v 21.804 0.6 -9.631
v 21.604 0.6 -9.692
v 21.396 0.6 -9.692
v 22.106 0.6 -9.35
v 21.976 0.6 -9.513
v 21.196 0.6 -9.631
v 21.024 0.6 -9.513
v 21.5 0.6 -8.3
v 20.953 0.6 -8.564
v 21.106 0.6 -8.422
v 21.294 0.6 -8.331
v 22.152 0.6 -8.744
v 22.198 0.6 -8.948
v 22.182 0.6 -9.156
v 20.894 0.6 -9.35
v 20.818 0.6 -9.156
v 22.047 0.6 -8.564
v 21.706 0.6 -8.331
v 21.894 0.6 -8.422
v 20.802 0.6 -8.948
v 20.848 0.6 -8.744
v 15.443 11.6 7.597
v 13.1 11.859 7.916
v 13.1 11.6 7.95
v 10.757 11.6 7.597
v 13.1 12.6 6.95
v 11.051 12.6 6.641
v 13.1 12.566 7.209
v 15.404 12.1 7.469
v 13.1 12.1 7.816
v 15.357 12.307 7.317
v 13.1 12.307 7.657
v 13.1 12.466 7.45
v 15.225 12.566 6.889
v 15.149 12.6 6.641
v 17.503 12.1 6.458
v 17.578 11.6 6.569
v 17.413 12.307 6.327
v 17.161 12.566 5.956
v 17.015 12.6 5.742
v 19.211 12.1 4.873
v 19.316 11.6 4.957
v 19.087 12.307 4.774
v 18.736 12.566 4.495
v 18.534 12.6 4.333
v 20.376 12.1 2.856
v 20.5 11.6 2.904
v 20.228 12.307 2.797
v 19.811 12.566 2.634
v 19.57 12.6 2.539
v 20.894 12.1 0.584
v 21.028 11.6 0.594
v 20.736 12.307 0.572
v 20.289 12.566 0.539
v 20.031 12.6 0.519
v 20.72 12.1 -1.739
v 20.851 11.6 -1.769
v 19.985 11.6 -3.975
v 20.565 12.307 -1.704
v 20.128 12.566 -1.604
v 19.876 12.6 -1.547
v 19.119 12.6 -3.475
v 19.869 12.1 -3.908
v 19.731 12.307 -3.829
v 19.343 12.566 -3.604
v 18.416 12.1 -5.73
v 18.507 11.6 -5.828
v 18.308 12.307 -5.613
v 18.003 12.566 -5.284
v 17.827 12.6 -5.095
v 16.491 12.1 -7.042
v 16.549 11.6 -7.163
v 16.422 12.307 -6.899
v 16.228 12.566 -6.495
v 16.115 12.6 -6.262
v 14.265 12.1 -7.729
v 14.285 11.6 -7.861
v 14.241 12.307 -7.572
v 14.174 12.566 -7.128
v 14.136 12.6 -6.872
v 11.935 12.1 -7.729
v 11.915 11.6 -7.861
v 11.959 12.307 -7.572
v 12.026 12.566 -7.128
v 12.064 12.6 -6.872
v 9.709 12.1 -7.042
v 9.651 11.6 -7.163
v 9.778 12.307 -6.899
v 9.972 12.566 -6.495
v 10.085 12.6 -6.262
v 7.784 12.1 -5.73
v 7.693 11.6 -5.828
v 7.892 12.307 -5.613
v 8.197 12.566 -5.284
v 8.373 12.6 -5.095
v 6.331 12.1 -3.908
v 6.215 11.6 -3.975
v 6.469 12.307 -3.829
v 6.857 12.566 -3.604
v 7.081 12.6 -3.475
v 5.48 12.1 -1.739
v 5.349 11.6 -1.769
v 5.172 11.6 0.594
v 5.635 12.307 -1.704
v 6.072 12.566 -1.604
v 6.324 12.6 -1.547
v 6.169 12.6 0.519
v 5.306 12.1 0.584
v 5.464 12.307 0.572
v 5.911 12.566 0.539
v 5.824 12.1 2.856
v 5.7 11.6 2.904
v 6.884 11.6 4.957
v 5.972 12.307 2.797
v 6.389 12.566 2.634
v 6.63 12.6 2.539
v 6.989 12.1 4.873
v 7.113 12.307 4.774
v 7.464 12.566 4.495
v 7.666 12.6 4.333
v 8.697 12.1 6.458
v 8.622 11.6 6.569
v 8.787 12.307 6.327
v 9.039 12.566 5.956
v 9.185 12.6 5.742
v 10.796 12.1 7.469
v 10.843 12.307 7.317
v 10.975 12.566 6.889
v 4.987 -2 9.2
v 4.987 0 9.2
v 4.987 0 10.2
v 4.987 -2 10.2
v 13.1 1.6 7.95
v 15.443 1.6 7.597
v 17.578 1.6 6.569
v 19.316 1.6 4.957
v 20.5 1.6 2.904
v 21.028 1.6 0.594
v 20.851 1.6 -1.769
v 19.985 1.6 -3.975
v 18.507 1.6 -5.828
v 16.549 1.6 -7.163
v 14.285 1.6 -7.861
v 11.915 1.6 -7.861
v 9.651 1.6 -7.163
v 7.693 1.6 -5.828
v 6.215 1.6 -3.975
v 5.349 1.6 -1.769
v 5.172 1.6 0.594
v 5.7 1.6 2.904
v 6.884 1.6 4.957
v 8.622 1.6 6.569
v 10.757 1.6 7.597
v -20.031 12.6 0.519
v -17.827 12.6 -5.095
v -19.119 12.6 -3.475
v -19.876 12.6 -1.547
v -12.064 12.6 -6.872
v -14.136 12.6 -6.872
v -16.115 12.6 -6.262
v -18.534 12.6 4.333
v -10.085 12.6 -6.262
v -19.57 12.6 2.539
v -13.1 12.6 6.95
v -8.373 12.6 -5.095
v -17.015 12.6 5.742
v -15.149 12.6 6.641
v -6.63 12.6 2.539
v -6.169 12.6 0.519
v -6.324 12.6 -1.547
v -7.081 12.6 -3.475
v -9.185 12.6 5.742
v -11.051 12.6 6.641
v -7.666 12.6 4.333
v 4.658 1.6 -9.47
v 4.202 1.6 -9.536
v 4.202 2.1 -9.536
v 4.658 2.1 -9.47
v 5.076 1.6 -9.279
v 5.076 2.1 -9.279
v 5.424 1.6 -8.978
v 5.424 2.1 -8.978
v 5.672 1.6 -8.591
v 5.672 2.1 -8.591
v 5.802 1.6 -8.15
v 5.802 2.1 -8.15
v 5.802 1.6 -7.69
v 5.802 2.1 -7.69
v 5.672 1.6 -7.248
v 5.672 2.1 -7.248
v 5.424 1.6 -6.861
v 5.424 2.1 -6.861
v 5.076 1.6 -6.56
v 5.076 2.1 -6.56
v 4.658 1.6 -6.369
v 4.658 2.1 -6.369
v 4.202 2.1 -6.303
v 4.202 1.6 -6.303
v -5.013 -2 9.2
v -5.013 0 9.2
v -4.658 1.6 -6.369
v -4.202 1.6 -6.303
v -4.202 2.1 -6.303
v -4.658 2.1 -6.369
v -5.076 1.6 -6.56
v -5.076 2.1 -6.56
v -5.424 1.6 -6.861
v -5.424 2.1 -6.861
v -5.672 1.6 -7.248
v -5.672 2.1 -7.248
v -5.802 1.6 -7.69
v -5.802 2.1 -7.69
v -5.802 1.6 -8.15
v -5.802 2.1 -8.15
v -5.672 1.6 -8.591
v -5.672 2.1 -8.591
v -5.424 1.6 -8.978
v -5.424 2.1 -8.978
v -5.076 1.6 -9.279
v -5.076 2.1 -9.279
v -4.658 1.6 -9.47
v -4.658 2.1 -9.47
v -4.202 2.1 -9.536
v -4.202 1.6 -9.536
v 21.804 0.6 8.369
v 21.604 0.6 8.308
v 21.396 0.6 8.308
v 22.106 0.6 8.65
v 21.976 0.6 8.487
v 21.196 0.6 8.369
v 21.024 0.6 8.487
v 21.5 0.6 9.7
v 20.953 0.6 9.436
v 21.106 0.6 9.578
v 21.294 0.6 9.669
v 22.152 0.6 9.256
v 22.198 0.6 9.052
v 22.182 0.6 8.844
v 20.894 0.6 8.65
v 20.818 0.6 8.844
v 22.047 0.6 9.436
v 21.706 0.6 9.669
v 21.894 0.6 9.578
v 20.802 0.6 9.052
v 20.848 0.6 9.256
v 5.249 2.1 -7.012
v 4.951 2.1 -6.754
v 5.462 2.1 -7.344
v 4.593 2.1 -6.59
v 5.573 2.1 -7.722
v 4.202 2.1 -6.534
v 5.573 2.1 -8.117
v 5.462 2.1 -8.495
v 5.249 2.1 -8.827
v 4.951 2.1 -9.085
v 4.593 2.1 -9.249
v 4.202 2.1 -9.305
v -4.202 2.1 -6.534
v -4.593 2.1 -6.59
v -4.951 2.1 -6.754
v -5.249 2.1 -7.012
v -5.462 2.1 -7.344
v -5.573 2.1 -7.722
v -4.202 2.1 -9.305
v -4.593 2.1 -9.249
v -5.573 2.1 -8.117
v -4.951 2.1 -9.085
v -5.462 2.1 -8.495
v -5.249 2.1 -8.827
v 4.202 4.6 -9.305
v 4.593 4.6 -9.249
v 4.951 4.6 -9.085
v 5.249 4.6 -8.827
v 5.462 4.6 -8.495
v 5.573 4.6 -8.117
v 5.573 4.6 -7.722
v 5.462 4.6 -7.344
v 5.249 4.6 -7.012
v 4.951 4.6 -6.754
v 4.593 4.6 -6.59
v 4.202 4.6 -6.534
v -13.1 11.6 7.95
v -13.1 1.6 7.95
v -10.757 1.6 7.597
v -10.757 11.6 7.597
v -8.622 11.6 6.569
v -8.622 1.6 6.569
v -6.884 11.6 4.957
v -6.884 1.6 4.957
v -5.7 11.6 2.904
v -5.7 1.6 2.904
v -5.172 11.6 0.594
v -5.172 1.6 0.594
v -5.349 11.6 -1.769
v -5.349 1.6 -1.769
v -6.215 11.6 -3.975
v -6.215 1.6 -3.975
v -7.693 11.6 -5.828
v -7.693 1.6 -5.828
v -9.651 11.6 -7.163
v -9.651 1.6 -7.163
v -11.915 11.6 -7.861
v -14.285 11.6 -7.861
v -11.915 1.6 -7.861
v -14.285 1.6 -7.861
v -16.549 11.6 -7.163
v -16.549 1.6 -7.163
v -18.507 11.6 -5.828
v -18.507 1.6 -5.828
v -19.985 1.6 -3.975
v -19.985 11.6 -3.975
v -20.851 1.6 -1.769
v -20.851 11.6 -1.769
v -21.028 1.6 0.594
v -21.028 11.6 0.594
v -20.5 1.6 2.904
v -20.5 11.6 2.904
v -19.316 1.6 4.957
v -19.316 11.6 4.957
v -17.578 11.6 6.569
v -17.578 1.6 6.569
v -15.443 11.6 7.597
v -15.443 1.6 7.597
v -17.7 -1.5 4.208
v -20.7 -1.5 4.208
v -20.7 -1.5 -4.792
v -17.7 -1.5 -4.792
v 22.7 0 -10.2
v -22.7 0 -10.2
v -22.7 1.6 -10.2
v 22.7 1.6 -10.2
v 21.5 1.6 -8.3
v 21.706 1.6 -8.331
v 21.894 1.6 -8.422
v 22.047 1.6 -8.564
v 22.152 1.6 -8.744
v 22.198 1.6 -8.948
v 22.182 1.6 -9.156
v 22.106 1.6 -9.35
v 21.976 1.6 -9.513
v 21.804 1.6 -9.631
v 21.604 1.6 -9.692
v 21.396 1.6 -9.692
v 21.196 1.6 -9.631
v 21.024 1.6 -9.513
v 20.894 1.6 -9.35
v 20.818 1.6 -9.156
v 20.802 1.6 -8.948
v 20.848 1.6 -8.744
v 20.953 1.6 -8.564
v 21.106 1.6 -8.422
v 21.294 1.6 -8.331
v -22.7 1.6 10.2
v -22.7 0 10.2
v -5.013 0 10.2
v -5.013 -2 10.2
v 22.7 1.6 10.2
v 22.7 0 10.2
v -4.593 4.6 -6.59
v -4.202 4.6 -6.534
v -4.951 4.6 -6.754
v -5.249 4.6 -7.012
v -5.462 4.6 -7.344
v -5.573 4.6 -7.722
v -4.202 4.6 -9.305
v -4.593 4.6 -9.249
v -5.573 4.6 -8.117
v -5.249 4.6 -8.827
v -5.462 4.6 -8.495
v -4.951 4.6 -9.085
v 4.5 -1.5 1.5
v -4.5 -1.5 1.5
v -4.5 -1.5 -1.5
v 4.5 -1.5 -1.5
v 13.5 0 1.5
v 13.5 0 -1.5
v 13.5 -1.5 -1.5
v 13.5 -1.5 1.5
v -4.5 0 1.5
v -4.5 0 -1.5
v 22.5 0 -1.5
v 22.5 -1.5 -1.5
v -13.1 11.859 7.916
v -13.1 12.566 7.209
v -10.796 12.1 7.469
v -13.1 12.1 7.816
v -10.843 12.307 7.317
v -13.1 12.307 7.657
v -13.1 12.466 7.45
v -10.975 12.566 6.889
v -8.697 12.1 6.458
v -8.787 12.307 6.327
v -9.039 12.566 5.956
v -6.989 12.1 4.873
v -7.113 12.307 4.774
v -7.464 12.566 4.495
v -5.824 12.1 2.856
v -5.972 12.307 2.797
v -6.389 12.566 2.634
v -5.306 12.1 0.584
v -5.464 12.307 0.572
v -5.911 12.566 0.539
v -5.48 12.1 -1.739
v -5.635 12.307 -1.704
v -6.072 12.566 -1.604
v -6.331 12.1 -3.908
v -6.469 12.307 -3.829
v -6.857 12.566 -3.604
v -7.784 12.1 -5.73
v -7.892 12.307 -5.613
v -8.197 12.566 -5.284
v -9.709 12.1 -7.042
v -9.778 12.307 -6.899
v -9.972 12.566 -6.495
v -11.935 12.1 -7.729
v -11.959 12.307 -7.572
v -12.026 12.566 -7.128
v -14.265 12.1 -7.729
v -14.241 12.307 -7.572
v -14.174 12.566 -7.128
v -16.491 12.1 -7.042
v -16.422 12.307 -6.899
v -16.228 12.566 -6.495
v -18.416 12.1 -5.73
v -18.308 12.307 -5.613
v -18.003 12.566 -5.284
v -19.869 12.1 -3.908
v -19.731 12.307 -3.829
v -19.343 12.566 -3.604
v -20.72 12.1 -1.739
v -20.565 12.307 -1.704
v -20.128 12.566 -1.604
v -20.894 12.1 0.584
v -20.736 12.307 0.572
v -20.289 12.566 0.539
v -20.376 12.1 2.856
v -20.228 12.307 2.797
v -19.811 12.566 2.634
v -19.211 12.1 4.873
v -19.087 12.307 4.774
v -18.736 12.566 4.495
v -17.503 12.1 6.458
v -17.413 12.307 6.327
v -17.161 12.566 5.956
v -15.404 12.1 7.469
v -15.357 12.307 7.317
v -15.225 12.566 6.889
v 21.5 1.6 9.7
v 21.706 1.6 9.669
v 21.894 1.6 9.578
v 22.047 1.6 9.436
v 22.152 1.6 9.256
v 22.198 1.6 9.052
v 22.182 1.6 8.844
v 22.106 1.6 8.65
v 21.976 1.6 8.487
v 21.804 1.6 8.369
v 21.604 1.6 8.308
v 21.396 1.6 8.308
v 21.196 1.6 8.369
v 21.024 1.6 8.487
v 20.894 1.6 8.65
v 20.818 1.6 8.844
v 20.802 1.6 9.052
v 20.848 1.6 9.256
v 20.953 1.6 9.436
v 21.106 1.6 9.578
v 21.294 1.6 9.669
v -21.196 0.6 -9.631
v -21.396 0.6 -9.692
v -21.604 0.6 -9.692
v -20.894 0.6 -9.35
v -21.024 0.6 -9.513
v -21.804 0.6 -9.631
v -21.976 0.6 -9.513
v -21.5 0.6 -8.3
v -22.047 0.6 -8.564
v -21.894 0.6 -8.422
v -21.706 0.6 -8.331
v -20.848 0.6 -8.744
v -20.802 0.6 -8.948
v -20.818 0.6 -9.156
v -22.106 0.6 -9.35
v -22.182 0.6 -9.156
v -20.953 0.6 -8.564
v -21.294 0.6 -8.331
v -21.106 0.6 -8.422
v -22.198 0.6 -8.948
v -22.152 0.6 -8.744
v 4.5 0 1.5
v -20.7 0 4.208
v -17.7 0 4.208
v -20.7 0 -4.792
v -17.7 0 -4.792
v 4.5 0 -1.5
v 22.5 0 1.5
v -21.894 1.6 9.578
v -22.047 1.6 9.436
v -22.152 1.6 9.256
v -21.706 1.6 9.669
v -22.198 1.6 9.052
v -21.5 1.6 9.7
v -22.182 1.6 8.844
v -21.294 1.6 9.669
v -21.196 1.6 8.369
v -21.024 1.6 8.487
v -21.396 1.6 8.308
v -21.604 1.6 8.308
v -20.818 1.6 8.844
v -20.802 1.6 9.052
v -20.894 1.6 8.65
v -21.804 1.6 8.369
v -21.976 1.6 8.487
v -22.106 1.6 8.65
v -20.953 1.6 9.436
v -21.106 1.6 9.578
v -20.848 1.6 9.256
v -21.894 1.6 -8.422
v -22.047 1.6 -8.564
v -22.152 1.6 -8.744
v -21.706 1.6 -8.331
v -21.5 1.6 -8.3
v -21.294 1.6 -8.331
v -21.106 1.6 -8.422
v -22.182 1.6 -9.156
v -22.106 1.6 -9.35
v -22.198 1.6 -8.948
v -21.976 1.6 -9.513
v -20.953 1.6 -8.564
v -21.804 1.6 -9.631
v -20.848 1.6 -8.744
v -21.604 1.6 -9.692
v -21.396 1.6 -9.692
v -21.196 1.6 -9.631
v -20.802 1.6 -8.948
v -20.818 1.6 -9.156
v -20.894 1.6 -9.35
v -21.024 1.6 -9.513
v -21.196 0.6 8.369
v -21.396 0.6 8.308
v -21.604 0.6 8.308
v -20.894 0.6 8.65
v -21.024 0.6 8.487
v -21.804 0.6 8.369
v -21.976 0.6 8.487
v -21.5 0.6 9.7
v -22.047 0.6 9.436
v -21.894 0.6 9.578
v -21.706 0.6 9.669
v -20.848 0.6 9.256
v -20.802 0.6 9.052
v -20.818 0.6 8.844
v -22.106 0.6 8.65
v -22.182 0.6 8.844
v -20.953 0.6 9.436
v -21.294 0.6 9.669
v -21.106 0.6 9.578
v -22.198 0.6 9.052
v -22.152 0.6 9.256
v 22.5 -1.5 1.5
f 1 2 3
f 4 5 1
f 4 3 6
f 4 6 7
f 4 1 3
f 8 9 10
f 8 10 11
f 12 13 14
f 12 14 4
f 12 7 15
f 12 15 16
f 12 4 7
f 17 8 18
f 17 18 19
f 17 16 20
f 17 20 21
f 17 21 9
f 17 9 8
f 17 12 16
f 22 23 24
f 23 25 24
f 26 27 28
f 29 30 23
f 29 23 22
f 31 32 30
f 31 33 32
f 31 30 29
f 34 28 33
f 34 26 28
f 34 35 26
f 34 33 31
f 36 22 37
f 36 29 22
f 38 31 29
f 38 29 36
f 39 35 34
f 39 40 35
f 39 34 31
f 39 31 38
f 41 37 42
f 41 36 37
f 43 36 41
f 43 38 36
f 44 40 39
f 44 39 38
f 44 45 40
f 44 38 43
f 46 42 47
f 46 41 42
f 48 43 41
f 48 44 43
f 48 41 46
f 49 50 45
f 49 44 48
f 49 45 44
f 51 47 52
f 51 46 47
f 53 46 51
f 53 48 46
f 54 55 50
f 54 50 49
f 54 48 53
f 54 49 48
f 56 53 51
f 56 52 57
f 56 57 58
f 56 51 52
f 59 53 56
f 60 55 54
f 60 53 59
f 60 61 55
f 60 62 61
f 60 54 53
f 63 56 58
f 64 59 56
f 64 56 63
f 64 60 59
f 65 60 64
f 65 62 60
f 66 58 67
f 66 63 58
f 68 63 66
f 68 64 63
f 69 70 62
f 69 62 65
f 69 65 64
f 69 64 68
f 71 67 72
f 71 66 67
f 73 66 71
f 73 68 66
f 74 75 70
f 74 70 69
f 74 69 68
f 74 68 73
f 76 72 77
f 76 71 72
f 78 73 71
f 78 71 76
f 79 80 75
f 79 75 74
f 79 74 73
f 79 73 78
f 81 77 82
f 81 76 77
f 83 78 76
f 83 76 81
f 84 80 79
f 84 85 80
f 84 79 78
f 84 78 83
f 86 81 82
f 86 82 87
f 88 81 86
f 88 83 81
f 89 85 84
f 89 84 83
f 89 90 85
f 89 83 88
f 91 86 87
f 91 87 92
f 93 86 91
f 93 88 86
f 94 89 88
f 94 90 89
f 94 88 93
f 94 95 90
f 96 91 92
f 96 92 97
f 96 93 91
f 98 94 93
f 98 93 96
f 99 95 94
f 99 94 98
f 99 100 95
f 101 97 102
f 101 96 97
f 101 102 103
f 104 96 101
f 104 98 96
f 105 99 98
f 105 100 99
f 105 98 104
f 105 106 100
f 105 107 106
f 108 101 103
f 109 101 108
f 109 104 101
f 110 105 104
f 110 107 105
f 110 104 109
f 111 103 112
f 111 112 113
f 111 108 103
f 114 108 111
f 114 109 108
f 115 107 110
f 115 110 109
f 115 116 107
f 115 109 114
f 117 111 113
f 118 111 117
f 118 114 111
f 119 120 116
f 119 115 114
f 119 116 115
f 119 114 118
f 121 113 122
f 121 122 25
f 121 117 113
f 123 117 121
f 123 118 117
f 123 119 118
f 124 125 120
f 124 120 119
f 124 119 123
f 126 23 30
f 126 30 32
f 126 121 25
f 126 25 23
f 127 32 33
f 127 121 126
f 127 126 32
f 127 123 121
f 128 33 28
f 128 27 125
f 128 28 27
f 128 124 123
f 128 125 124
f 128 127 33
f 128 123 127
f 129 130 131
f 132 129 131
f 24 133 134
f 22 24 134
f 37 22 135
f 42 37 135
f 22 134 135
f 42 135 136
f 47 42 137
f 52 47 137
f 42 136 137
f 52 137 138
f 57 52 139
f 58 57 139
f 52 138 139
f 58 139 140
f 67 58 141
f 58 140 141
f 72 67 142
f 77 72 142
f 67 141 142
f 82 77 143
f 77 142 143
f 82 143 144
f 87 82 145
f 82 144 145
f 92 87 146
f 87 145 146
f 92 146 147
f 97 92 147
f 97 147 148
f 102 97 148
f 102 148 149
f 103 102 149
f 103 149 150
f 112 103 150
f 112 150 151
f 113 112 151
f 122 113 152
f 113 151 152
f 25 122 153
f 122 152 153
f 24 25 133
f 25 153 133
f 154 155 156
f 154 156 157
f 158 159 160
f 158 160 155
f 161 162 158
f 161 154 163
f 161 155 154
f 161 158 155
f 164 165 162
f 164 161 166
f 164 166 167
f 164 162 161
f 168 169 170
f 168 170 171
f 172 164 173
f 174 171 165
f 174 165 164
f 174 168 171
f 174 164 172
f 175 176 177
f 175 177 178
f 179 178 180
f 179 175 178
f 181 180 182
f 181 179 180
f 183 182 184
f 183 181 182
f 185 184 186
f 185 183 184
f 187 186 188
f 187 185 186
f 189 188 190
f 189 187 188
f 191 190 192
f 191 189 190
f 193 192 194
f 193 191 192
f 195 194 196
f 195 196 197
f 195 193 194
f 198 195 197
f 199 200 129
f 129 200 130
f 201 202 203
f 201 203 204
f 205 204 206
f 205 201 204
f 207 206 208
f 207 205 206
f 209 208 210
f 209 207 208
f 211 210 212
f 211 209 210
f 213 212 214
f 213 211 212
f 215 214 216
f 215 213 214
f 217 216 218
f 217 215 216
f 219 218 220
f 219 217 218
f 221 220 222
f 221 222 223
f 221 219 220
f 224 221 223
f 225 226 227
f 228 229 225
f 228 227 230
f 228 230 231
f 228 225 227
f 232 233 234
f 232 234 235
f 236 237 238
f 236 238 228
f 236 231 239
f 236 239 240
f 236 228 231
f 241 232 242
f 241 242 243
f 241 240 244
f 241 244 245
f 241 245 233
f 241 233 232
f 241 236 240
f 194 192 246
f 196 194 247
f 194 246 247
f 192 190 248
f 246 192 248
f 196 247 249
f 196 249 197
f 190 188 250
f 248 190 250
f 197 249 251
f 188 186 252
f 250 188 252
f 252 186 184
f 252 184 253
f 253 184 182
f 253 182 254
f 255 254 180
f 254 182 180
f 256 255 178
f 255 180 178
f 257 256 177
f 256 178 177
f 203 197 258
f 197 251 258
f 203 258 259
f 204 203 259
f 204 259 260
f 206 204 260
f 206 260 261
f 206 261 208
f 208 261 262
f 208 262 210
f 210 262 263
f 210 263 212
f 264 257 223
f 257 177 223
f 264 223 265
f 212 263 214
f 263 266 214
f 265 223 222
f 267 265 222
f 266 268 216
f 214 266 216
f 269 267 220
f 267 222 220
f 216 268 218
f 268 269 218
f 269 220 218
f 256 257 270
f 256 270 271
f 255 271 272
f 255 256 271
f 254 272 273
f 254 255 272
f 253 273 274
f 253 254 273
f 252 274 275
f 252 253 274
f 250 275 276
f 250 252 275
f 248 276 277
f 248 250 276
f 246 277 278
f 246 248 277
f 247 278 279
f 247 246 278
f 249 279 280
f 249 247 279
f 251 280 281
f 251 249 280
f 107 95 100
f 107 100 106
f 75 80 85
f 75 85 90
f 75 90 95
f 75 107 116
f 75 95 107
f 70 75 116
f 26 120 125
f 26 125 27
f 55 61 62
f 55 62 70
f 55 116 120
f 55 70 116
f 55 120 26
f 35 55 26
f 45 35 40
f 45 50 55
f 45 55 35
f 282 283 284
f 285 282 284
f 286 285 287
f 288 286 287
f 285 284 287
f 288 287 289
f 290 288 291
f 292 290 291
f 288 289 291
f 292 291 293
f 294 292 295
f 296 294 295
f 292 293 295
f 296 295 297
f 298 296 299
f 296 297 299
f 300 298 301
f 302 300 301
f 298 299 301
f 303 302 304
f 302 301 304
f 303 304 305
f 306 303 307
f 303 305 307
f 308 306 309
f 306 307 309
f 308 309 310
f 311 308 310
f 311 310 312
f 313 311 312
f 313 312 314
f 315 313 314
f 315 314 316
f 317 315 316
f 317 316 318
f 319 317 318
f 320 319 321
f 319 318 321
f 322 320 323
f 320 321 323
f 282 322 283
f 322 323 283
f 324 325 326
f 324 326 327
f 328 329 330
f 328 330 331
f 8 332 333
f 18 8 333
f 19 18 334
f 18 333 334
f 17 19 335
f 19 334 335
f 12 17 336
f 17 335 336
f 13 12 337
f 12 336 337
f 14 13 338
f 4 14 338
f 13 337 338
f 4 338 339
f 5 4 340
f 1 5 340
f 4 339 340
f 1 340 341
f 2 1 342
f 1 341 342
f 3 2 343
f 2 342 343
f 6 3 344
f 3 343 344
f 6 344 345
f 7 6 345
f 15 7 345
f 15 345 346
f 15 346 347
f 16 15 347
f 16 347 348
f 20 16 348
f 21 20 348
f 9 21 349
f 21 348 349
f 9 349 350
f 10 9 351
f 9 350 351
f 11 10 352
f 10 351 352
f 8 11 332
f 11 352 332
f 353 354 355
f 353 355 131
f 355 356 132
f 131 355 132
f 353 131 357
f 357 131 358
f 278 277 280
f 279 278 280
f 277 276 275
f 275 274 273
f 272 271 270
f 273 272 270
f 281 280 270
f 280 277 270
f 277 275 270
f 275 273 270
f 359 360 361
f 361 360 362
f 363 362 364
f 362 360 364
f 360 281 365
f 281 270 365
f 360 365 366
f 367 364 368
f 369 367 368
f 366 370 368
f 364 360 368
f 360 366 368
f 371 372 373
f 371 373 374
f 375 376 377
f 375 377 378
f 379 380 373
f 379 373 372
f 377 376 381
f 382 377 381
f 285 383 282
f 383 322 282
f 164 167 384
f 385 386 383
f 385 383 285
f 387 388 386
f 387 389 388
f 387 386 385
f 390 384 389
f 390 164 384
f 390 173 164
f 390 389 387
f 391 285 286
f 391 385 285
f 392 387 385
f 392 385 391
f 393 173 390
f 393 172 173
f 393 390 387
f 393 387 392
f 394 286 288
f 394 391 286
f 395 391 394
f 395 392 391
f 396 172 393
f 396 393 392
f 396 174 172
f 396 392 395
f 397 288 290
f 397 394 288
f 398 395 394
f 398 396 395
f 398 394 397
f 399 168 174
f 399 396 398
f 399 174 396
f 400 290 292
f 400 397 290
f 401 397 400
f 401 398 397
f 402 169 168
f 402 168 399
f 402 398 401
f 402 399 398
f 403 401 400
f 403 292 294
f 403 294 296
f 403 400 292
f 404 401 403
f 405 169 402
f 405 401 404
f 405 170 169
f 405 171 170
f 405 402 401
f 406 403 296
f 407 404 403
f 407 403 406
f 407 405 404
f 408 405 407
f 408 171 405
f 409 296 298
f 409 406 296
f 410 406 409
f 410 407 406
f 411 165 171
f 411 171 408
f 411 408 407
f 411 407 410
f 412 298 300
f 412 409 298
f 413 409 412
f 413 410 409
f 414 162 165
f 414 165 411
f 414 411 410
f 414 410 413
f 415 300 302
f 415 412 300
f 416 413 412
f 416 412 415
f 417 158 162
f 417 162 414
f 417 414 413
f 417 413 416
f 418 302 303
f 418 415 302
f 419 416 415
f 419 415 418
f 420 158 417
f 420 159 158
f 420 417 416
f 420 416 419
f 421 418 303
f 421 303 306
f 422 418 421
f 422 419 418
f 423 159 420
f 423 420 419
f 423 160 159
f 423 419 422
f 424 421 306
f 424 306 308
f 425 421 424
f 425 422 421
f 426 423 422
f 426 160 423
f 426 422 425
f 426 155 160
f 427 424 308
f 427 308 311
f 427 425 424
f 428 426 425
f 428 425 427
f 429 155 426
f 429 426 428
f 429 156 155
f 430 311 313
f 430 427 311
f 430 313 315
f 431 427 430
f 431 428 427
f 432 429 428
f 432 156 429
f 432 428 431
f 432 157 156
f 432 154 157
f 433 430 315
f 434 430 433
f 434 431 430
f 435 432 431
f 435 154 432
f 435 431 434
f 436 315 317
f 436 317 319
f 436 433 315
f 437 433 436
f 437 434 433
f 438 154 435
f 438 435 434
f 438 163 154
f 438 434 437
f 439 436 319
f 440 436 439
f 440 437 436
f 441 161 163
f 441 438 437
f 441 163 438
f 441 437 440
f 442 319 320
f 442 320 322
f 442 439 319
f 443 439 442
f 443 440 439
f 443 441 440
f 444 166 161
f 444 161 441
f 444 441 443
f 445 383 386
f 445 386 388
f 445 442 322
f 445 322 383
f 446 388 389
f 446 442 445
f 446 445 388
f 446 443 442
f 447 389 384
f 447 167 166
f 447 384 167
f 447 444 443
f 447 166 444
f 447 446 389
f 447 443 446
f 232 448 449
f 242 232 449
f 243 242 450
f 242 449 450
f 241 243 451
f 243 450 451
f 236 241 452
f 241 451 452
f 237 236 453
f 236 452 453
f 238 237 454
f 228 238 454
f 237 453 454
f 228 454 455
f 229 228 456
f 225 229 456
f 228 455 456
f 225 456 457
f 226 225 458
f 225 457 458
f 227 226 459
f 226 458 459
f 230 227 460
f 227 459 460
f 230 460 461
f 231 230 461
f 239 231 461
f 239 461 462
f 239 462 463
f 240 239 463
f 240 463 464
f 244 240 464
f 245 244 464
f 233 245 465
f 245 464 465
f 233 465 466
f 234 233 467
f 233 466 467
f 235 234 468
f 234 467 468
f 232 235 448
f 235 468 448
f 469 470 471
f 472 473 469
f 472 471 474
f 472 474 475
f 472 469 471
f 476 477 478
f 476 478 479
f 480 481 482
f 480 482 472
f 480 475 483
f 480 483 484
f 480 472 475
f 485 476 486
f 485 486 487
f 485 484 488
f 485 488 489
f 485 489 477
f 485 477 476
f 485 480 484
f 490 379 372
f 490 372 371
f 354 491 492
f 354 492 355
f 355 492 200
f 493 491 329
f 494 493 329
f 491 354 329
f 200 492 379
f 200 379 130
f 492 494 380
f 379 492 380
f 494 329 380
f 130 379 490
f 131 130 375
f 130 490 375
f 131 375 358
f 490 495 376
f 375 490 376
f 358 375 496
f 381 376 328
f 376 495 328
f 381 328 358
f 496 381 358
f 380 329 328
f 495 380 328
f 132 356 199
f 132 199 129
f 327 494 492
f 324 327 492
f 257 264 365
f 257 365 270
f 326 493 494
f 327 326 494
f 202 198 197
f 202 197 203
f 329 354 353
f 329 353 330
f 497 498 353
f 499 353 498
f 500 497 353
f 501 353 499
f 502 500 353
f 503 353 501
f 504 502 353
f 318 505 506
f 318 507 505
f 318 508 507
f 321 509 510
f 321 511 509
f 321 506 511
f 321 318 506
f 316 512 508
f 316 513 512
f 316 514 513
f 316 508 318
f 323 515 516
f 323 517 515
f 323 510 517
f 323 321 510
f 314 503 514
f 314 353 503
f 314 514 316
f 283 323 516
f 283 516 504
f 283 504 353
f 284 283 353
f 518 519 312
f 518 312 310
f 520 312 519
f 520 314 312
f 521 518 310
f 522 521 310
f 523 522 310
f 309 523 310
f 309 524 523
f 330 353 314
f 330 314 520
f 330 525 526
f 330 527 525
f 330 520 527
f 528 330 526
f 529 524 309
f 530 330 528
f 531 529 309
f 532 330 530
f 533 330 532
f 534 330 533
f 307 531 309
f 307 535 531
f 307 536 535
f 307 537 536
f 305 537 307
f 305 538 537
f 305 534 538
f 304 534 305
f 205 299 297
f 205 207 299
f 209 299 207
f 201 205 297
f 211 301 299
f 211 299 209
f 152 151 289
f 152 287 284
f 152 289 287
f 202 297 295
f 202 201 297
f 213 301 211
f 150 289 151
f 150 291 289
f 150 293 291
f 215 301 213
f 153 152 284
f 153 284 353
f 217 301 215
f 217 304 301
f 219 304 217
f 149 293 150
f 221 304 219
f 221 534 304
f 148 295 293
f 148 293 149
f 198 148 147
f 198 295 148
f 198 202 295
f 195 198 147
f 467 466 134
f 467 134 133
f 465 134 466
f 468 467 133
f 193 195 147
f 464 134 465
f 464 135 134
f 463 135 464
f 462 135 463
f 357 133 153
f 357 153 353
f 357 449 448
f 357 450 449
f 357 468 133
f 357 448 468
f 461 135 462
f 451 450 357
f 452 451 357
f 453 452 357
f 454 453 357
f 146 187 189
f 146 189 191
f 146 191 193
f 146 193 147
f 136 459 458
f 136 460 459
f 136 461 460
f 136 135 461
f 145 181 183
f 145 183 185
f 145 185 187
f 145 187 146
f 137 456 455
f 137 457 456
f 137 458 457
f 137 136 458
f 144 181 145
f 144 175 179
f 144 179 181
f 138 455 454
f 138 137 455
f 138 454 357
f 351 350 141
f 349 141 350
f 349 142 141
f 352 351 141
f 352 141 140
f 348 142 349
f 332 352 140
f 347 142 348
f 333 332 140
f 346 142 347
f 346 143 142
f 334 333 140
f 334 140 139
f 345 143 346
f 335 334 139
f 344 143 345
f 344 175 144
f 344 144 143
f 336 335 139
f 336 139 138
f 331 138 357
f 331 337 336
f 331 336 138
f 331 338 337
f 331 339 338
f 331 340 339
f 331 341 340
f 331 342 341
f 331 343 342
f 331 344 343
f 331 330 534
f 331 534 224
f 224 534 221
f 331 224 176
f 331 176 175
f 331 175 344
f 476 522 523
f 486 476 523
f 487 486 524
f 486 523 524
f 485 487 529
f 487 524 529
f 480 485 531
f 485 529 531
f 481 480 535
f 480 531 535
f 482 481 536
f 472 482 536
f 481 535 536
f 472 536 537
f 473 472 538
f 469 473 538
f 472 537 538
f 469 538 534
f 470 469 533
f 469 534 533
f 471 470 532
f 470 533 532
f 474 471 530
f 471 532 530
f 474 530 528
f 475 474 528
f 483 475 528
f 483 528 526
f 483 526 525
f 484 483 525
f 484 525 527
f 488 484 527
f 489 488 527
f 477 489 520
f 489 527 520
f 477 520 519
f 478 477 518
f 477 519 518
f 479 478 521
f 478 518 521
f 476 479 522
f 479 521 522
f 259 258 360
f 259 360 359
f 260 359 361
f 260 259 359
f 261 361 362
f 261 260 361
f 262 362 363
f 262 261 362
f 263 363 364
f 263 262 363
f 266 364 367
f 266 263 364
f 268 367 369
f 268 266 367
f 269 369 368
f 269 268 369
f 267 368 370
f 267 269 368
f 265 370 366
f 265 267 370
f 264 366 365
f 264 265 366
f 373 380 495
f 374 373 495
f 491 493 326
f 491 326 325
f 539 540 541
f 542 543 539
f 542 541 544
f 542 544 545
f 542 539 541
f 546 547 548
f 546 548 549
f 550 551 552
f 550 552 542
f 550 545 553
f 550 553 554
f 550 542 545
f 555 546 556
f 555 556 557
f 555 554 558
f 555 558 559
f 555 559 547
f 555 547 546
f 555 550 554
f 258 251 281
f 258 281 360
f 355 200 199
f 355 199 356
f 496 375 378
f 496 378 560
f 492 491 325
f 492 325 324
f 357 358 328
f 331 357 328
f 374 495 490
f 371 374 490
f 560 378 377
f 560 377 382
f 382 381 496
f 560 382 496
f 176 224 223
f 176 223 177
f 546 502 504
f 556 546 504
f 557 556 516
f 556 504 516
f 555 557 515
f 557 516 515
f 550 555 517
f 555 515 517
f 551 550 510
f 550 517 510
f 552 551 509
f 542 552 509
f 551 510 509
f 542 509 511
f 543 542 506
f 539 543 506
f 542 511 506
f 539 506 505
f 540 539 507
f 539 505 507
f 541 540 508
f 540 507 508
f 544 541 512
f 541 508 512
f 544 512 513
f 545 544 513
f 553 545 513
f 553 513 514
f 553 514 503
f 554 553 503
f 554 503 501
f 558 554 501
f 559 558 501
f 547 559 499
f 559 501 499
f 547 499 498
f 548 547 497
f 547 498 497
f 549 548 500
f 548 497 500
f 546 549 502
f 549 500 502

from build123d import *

# Parameters (mm, degrees)
CROQUIS1_W              = 45.4
CROQUIS1_H              = 20.4
SALIENTE_EXTRUIR1_DEPTH = 1.6
CROQUIS2_R              = 0.7
CORTAR_EXTRUIR1_DEPTH   = 1
SALIENTE_EXTRUIR2_DEPTH = 0.5
SALIENTE_EXTRUIR3_DEPTH = 3
CROQUIS9_R              = 7.95
SALIENTE_EXTRUIR4_DEPTH = 11
CROQUIS10_W             = 10
CROQUIS10_H             = 1
SALIENTE_EXTRUIR5_DEPTH = 2
REDONDEO5_R             = 1
CROQUIS13_W             = 9
CROQUIS13_H             = 3
SALIENTE_EXTRUIR6_DEPTH = 1.5
MATRIZL2_COUNT          = 2
MATRIZL2_PITCH          = 18
CROQUIS14_W             = 3
CROQUIS14_H             = 9
SALIENTE_EXTRUIR7_DEPTH = 1.5


with BuildPart() as part:
    # Croquis1 → Saliente-Extruir1 (new body)
    with BuildSketch(Plane(origin=(0, 0, 0), x_dir=(1, 0, 0), z_dir=(0, 1, 0))):
        Rectangle(CROQUIS1_W, CROQUIS1_H)
    extrude(amount=SALIENTE_EXTRUIR1_DEPTH)

    # Croquis2 → Cortar-Extruir1 (cut)
    with BuildSketch(Plane(origin=(0, 1.6, 0), x_dir=(1, 0, 0), z_dir=(0, 1, 0))):
        with Locations(Location((-21.5, 9, 0), (0, 0, 270))):
            Circle(CROQUIS2_R)
        with Locations(Location((21.5, 9, 0), (0, 0, 270))):
            Circle(CROQUIS2_R)
        with Locations(Location((21.5, -9, 0), (0, 0, 270))):
            Circle(CROQUIS2_R)
        with Locations(Location((-21.5, -9, 0), (0, 0, 270))):
            Circle(CROQUIS2_R)
    extrude(amount=-CORTAR_EXTRUIR1_DEPTH, mode=Mode.SUBTRACT)

    # Croquis3 → Saliente-Extruir2 (add)
    with BuildSketch(Plane(origin=(0, 1.6, 0), x_dir=(1, 0, 0), z_dir=(0, 1, 0))):
        with BuildLine():
            Line((-4.202221616, 9.535810589), (4.202221616, 9.535810589))
            ThreePointArc((4.202221616, 9.535810589), (5.818460699, 7.919571506), (4.202221616, 6.303332424))
            Line((4.202221616, 6.303332424), (-4.202221616, 6.303332424))
            ThreePointArc((-4.202221616, 6.303332424), (-5.818460699, 7.919571506), (-4.202221616, 9.535810589))
        make_face()
        with BuildLine():
            Line((-4.202221616, 9.304919292), (4.202221616, 9.304919292))
            ThreePointArc((4.202221616, 9.304919292), (5.587569401, 7.919571506), (4.202221616, 6.534223721))
            Line((4.202221616, 6.534223721), (-4.202221616, 6.534223721))
            ThreePointArc((-4.202221616, 6.534223721), (-5.587569401, 7.919571506), (-4.202221616, 9.304919292))
        make_face(mode=Mode.SUBTRACT)
    extrude(amount=SALIENTE_EXTRUIR2_DEPTH)

    # Croquis8 → Saliente-Extruir3 (add)
    with BuildSketch(Plane(origin=(0, 1.6, 0), x_dir=(1, 0, 0), z_dir=(0, 1, 0))):
        with BuildLine():
            Line((-4.202221616, 9.304919292), (4.202221616, 9.304919292))
            ThreePointArc((4.202221616, 9.304919292), (5.587569401, 7.919571506), (4.202221616, 6.534223721))
            Line((4.202221616, 6.534223721), (-4.202221616, 6.534223721))
            ThreePointArc((-4.202221616, 6.534223721), (-5.587569401, 7.919571506), (-4.202221616, 9.304919292))
        make_face()
    extrude(amount=SALIENTE_EXTRUIR3_DEPTH)

    # Croquis9 → Saliente-Extruir4 (add)
    with BuildSketch(Plane(origin=(0, 1.6, 0), x_dir=(1, 0, 0), z_dir=(0, 1, 0))):
        with Locations(Location((-13.1, 0, 0), (0, 0, 270))):
            Circle(CROQUIS9_R)
        with Locations(Location((13.1, 0, 0), (0, 0, 270))):
            Circle(CROQUIS9_R)
    extrude(amount=SALIENTE_EXTRUIR4_DEPTH)

    # Croquis10 → Saliente-Extruir5 (add)
    with BuildSketch(Plane.XZ):
        with Locations((-0.012747973, 9.7)):
            Rectangle(CROQUIS10_W, CROQUIS10_H)
    extrude(amount=SALIENTE_EXTRUIR5_DEPTH)

    # Redondeo5
    redondeo5_edges = [part.edges().sort_by_distance(p)[0] for p in [
        (-13.1, 12.6, -7.95),
        (13.1, 12.6, -7.95),
    ]]
    fillet(redondeo5_edges, radius=REDONDEO5_R)

    # Croquis13 → Saliente-Extruir6 (add)
    with BuildSketch(Plane.XZ):
        Rectangle(CROQUIS13_W, CROQUIS13_H)
    saliente_extruir6 = extrude(amount=SALIENTE_EXTRUIR6_DEPTH)

    # MatrizL2: Saliente-Extruir6 ×2
    with Locations(*[(i * MATRIZL2_PITCH, 0, 0) for i in range(1, MATRIZL2_COUNT)]):
        add(saliente_extruir6)

    # Croquis14 → Saliente-Extruir7 (add)
    with BuildSketch(Plane.XZ):
        with Locations((-19.2, -0.292211089)):
            Rectangle(CROQUIS14_W, CROQUIS14_H)
    extrude(amount=SALIENTE_EXTRUIR7_DEPTH)


solid = part.part
